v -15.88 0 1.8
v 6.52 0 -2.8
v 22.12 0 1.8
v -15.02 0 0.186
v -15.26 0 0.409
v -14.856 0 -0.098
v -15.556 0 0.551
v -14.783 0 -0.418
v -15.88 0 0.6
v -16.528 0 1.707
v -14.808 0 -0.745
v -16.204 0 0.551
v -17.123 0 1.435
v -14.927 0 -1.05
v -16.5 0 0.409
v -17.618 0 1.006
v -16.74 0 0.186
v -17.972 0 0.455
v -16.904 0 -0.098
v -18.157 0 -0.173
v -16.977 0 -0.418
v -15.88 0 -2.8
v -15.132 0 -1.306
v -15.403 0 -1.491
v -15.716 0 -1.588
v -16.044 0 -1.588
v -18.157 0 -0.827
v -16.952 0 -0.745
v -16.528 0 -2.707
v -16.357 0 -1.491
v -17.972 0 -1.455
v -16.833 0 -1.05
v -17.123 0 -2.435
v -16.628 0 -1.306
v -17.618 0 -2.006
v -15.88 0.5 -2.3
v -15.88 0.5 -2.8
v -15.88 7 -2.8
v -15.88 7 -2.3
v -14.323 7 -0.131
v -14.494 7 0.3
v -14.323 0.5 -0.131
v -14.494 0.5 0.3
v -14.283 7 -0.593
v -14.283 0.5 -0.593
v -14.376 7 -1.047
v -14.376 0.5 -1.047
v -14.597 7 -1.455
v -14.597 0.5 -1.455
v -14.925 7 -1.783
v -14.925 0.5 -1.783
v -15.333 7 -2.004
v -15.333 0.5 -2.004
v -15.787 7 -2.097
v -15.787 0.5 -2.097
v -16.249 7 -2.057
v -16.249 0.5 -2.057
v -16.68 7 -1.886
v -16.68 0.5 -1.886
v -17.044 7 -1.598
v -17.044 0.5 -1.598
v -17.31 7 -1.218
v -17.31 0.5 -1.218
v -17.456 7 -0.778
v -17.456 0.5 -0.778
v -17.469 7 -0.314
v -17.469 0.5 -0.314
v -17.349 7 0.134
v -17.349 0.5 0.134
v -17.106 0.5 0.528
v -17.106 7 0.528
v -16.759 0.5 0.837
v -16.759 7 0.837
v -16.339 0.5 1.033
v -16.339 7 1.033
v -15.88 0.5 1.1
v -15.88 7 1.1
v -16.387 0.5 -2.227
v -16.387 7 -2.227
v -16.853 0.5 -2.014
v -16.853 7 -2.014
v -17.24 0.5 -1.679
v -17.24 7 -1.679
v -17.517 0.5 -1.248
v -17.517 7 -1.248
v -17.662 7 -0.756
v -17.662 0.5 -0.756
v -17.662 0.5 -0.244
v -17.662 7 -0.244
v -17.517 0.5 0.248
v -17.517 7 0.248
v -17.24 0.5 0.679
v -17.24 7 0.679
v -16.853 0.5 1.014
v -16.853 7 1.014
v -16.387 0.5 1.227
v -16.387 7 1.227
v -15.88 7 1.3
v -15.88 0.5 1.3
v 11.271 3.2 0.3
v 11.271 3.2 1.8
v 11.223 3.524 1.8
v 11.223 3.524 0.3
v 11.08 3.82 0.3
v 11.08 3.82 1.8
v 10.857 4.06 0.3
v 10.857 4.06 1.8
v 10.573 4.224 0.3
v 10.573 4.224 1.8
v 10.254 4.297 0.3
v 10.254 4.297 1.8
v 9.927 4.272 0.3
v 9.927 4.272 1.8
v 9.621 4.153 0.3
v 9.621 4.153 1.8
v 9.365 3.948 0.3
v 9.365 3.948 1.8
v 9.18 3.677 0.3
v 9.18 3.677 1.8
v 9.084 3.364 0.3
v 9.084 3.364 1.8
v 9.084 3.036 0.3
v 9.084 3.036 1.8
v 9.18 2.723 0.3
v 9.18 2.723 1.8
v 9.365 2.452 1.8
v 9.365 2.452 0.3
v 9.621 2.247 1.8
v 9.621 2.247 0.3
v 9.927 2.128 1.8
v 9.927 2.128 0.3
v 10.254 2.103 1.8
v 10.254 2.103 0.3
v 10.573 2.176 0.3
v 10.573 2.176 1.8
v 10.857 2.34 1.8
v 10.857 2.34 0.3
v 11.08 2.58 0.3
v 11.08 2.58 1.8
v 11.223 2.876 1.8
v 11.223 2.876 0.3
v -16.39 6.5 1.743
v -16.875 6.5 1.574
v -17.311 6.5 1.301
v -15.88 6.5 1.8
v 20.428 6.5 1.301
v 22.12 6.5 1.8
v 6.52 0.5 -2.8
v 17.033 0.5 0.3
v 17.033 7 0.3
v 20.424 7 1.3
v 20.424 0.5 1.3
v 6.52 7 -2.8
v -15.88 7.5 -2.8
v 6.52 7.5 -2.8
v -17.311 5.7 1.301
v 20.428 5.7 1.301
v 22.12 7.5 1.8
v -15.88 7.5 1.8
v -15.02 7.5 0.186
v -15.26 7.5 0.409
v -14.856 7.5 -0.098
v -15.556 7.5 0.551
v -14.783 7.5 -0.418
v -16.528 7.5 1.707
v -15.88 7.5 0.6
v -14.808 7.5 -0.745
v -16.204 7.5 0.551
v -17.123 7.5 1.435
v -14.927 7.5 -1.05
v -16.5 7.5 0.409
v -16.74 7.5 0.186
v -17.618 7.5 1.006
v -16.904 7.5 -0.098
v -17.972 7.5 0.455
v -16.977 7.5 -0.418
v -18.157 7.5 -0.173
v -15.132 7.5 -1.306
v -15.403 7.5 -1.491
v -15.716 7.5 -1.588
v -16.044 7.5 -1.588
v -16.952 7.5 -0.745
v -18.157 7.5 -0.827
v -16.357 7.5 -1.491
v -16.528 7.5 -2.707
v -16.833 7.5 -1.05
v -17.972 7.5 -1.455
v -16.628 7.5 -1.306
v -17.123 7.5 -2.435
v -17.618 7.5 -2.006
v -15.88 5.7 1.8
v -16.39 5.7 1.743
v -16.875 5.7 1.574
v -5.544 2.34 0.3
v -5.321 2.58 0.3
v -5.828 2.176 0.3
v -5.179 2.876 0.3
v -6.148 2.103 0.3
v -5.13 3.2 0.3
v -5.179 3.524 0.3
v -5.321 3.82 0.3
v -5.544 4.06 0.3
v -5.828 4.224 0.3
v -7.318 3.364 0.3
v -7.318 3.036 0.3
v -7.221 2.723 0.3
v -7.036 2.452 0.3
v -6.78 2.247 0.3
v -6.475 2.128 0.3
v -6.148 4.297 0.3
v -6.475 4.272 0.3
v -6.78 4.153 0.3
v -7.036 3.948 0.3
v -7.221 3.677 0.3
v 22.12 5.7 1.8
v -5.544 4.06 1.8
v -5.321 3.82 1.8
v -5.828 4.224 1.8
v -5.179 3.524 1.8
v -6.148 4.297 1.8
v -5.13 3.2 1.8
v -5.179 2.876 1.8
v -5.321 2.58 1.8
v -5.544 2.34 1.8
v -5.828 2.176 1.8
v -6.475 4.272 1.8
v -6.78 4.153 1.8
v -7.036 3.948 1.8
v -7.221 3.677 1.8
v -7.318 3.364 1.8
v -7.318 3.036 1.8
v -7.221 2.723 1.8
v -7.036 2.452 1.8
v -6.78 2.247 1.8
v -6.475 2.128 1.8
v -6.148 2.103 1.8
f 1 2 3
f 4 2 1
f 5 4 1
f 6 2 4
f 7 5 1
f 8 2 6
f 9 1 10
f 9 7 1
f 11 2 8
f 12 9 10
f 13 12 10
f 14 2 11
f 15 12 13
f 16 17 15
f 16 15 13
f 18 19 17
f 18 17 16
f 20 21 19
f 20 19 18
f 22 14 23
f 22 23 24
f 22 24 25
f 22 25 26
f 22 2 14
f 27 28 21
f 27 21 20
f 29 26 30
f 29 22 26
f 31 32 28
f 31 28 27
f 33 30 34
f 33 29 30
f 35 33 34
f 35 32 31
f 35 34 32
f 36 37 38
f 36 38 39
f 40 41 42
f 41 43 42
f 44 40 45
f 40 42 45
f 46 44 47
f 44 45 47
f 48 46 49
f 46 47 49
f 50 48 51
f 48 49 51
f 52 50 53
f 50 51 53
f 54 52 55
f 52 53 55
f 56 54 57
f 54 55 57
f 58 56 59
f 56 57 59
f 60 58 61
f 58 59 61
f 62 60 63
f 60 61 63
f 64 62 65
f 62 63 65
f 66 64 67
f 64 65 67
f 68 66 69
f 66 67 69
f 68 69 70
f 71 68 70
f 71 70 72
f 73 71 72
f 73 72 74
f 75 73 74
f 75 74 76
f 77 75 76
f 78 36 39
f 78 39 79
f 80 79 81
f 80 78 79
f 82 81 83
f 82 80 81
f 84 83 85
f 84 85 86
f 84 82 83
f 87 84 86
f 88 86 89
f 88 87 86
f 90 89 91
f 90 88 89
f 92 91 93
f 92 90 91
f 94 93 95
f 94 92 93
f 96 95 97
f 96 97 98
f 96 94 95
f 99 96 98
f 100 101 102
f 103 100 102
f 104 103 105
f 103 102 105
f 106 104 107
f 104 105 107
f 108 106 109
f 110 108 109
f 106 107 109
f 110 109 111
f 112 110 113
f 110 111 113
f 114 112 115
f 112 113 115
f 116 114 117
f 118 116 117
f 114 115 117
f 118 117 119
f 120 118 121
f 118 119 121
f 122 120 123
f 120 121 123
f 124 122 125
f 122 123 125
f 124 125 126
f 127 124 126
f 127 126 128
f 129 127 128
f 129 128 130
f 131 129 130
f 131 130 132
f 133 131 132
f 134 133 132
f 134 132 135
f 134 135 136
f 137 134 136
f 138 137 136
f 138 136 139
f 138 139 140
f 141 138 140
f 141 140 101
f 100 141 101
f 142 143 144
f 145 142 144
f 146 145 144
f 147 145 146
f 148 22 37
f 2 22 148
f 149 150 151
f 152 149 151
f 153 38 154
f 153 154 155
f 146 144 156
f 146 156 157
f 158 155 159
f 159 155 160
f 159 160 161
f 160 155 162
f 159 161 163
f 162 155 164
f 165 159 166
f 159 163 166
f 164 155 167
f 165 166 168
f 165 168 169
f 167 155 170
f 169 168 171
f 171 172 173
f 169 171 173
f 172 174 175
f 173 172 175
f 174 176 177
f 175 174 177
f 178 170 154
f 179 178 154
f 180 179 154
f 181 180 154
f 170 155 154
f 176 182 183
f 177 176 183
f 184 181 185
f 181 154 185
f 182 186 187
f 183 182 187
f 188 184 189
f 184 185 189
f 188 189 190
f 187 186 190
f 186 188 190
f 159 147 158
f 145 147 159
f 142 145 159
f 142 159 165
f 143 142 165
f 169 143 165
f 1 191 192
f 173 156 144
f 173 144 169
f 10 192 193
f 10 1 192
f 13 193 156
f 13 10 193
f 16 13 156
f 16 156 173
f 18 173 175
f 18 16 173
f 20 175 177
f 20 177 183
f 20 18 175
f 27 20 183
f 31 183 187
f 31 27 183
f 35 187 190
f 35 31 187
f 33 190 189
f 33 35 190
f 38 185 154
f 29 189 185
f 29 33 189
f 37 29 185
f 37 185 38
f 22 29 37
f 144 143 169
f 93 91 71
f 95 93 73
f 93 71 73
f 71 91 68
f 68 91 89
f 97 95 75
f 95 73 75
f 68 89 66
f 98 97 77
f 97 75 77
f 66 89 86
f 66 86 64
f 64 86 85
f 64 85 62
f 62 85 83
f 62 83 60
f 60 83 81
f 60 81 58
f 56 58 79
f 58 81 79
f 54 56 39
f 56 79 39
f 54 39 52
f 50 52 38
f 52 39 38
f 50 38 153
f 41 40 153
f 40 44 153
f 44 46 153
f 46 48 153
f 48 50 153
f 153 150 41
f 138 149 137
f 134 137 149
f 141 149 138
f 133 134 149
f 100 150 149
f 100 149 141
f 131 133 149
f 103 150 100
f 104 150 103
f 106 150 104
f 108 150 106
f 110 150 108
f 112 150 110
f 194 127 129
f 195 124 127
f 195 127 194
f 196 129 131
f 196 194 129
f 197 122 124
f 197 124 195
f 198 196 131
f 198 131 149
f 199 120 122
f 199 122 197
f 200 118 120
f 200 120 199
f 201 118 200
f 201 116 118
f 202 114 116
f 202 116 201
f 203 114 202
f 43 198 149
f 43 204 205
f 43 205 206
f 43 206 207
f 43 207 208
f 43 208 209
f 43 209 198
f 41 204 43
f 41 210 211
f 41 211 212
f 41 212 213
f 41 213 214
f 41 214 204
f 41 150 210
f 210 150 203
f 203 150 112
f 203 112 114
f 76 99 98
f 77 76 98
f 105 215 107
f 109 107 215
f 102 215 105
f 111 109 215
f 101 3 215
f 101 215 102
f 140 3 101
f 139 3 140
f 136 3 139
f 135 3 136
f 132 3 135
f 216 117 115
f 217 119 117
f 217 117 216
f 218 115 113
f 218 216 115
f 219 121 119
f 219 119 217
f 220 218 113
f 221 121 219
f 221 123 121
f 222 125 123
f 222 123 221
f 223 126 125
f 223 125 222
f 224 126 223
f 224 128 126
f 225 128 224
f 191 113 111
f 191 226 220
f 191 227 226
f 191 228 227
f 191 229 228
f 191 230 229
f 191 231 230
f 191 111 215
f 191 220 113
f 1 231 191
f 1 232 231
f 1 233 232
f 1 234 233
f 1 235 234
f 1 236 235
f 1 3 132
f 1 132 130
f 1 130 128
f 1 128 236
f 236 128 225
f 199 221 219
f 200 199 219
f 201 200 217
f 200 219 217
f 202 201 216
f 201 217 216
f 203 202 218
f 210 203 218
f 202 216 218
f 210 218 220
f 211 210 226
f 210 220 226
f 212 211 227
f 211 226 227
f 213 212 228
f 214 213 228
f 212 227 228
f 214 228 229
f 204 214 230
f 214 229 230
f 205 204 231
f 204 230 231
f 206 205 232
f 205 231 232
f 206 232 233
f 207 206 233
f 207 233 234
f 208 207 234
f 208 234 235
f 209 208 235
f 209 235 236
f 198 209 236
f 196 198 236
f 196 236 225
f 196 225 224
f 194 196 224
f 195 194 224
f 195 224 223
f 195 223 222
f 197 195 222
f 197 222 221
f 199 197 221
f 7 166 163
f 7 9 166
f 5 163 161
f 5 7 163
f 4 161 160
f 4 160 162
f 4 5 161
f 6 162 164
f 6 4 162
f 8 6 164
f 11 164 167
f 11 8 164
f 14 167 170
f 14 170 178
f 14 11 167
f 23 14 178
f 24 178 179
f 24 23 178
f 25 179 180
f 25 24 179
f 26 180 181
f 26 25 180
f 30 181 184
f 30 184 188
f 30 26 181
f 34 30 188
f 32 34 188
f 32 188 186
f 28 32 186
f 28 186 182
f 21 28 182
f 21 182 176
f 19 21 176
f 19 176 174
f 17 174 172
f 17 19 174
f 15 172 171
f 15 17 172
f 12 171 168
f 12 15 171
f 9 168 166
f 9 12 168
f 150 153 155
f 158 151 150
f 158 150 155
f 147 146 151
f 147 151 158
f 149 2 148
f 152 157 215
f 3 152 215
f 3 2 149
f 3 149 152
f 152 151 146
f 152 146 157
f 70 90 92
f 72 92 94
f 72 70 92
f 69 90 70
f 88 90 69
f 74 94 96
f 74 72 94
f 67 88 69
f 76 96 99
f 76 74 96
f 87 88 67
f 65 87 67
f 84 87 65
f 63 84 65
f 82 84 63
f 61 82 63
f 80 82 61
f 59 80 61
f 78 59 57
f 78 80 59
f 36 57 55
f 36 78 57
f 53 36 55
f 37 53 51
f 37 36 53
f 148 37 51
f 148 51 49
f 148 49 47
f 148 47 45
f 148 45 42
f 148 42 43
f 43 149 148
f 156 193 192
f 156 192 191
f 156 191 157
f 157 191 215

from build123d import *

# Parameters (mm, degrees)
SKETCH3_R           = 1.1
BOSS_EXTRUDE1_DEPTH = 7.5
SHELL1_START        = 0.5
SHELL1_OUTLINE_R    = 1.6
SHELL1_DEPTH        = 6.5
SKETCH5_W           = 36.304347826
SKETCH5_H           = 6.5
BOSS_EXTRUDE2_DEPTH = 1
CUT_EXTRUDE2_DEPTH  = 24.369518609
SKETCH7_R           = 1.1
CUT_EXTRUDE3_DEPTH  = 24.524123788
SKETCH10_W          = 87.275560702
SKETCH10_H          = 0.8
CUT_EXTRUDE15_DEPTH = 0.499
SKETCH11_R          = 1.1
CUT_EXTRUDE16_DEPTH = 24.805553974


# Read off the part's stored shape, not the designer's step: Shell1
with BuildPart() as part:
    # Sketch3 → Boss-Extrude1 (new body)
    with BuildSketch(Plane(origin=(0, 0, 0), x_dir=(1, 0, 0), z_dir=(0, 1, 0))):
        with BuildLine():
            Line((-15.88, 2.8), (6.52, 2.8))
            Line((6.52, 2.8), (22.12, -1.8))
            Line((22.12, -1.8), (-15.88, -1.8))
            ThreePointArc((-15.88, -1.8), (-18.18, 0.5), (-15.88, 2.8))
        make_face()
        with Locations(Location((-15.88, 0.5, 0), (0, 0, 270))):
            Circle(SKETCH3_R, mode=Mode.SUBTRACT)
    extrude(amount=BOSS_EXTRUDE1_DEPTH)

    # Shell1 outline → Shell1 (cut)
    with BuildSketch(Plane(origin=(0, 0, 0), x_dir=(1, 0, 0), z_dir=(0, 1, 0)).offset(SHELL1_START)):
        with BuildLine():
            Line((6.52, 2.8), (-15.88, 2.8))
            Line((-15.88, 2.8), (-15.88, 2.3))
            ThreePointArc((-15.88, 2.3), (-17.68, 0.5), (-15.88, -1.3))
            Line((-15.88, -1.3), (20.424347826, -1.3))
            Line((20.424347826, -1.3), (6.52, 2.8))
        make_face()
        with Locations((-15.88, 0.5)):
            Circle(SHELL1_OUTLINE_R, mode=Mode.SUBTRACT)
    extrude(amount=SHELL1_DEPTH, mode=Mode.SUBTRACT)

    # Sketch5 → Boss-Extrude2 (add)
    with BuildSketch(Plane(origin=(0, 0, 1.3), x_dir=(-1, 0, 0), z_dir=(0, 0, -1))):
        with Locations((-2.272173913, 3.75)):
            Rectangle(SKETCH5_W, SKETCH5_H)
    extrude(amount=BOSS_EXTRUDE2_DEPTH)

    # Sketch6 → Cut-Extrude2 (cut, through all)
    with BuildSketch(Plane(origin=(0, 7, 0), x_dir=(1, 0, 0), z_dir=(0, 1, 0))):
        Polygon((20.424347826, -0.3), (17.033043478, -0.3), (20.424347826, -1.3), align=None)
    extrude(amount=-CUT_EXTRUDE2_DEPTH, mode=Mode.SUBTRACT)

    # Sketch7 → Cut-Extrude3 (cut, through all)
    with BuildSketch(Plane(origin=(0, 7.5, 0), x_dir=(1, 0, 0), z_dir=(0, 1, 0))):
        with Locations(Location((-15.88, 0.5, 0), (0, 0, 270))):
            Circle(SKETCH7_R)
    extrude(amount=-CUT_EXTRUDE3_DEPTH, mode=Mode.SUBTRACT)

    # Sketch10 → Cut-Extrude15 (cut)
    with BuildSketch(Plane.XY.offset(1.8)):
        with Locations((23.190230884, 6.1)):
            Rectangle(SKETCH10_W, SKETCH10_H)
    extrude(amount=-CUT_EXTRUDE15_DEPTH, mode=Mode.SUBTRACT)

    # Sketch11 → Cut-Extrude16 (cut, through all)
    with BuildSketch(Plane.XY.offset(1.8)):
        with Locations((-6.23, 3.2)):
            Circle(SKETCH11_R)
        with Locations((10.1714, 3.2)):
            Circle(SKETCH11_R)
    extrude(amount=-CUT_EXTRUDE16_DEPTH, mode=Mode.SUBTRACT)


solid = part.part
